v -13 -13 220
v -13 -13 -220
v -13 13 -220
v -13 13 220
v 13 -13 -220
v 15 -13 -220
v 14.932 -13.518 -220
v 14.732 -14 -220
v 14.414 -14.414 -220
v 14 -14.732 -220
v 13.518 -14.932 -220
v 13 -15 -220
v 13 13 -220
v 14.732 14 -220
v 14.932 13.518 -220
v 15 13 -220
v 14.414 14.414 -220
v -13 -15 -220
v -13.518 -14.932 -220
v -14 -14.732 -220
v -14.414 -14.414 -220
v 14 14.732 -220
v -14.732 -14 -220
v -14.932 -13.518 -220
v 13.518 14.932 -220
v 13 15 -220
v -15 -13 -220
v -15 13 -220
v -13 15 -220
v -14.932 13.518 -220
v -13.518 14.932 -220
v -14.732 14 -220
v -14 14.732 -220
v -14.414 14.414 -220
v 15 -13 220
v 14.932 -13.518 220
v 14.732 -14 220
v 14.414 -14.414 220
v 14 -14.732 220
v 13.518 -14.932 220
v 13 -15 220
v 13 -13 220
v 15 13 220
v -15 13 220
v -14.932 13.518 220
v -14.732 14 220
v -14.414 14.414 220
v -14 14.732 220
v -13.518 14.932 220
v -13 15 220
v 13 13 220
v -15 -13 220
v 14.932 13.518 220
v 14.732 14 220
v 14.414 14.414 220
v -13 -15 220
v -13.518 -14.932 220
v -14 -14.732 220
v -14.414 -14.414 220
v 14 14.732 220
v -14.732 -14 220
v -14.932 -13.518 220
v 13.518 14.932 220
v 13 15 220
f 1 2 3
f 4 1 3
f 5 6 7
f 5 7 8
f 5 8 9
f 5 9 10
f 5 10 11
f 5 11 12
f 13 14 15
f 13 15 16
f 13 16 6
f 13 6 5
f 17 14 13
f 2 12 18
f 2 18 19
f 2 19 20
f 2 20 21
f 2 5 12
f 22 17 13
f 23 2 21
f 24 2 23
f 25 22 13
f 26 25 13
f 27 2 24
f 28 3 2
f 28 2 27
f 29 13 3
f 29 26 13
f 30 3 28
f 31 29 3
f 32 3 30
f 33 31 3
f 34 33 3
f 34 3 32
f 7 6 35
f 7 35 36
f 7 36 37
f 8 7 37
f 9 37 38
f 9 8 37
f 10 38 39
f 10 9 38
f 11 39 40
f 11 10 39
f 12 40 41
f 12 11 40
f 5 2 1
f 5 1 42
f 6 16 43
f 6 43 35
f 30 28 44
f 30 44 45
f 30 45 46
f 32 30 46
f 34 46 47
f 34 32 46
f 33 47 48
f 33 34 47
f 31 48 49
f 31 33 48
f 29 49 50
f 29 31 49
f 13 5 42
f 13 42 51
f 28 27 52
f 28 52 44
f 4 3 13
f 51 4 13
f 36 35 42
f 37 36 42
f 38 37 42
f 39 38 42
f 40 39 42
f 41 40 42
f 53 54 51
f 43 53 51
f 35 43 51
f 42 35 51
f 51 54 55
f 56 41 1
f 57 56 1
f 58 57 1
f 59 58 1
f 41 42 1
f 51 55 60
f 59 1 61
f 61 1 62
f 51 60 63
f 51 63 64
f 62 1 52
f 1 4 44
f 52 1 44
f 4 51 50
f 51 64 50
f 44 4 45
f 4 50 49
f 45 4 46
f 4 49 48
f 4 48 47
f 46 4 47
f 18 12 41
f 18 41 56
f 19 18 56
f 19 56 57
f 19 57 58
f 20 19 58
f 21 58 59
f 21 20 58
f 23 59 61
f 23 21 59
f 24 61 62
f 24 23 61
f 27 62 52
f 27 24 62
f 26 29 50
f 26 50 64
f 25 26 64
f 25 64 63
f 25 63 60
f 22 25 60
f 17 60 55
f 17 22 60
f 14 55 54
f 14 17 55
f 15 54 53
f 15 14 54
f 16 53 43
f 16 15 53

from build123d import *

# Parameters (mm, degrees)
Y_KSEKLIK_EKSTR_ZYON1_DEPTH      = 220
Y_KSEKLIK_EKSTR_ZYON1_DEPTH_BACK = 220
IZIM1_W                          = 26
IZIM1_H                          = 26


with BuildPart() as part:
    # Çizim1 → Yükseklik-Ekstrüzyon1 (new, two sides: drawn at the far end of the back side and taken through both)
    with BuildSketch(Plane.XY.offset(-Y_KSEKLIK_EKSTR_ZYON1_DEPTH_BACK)):
        with BuildLine():
            Line((-13, 15), (13, 15))
            ThreePointArc((13, 15), (14.414213562, 14.414213562), (15, 13))
            Line((15, 13), (15, -13))
            ThreePointArc((15, -13), (14.414213562, -14.414213562), (13, -15))
            Line((13, -15), (-13, -15))
            ThreePointArc((-13, -15), (-14.414213562, -14.414213562), (-15, -13))
            Line((-15, -13), (-15, 13))
            ThreePointArc((-15, 13), (-14.414213562, 14.414213562), (-13, 15))
        make_face()
        Rectangle(IZIM1_W, IZIM1_H, mode=Mode.SUBTRACT)
    extrude(amount=Y_KSEKLIK_EKSTR_ZYON1_DEPTH + Y_KSEKLIK_EKSTR_ZYON1_DEPTH_BACK)


solid = part.part
